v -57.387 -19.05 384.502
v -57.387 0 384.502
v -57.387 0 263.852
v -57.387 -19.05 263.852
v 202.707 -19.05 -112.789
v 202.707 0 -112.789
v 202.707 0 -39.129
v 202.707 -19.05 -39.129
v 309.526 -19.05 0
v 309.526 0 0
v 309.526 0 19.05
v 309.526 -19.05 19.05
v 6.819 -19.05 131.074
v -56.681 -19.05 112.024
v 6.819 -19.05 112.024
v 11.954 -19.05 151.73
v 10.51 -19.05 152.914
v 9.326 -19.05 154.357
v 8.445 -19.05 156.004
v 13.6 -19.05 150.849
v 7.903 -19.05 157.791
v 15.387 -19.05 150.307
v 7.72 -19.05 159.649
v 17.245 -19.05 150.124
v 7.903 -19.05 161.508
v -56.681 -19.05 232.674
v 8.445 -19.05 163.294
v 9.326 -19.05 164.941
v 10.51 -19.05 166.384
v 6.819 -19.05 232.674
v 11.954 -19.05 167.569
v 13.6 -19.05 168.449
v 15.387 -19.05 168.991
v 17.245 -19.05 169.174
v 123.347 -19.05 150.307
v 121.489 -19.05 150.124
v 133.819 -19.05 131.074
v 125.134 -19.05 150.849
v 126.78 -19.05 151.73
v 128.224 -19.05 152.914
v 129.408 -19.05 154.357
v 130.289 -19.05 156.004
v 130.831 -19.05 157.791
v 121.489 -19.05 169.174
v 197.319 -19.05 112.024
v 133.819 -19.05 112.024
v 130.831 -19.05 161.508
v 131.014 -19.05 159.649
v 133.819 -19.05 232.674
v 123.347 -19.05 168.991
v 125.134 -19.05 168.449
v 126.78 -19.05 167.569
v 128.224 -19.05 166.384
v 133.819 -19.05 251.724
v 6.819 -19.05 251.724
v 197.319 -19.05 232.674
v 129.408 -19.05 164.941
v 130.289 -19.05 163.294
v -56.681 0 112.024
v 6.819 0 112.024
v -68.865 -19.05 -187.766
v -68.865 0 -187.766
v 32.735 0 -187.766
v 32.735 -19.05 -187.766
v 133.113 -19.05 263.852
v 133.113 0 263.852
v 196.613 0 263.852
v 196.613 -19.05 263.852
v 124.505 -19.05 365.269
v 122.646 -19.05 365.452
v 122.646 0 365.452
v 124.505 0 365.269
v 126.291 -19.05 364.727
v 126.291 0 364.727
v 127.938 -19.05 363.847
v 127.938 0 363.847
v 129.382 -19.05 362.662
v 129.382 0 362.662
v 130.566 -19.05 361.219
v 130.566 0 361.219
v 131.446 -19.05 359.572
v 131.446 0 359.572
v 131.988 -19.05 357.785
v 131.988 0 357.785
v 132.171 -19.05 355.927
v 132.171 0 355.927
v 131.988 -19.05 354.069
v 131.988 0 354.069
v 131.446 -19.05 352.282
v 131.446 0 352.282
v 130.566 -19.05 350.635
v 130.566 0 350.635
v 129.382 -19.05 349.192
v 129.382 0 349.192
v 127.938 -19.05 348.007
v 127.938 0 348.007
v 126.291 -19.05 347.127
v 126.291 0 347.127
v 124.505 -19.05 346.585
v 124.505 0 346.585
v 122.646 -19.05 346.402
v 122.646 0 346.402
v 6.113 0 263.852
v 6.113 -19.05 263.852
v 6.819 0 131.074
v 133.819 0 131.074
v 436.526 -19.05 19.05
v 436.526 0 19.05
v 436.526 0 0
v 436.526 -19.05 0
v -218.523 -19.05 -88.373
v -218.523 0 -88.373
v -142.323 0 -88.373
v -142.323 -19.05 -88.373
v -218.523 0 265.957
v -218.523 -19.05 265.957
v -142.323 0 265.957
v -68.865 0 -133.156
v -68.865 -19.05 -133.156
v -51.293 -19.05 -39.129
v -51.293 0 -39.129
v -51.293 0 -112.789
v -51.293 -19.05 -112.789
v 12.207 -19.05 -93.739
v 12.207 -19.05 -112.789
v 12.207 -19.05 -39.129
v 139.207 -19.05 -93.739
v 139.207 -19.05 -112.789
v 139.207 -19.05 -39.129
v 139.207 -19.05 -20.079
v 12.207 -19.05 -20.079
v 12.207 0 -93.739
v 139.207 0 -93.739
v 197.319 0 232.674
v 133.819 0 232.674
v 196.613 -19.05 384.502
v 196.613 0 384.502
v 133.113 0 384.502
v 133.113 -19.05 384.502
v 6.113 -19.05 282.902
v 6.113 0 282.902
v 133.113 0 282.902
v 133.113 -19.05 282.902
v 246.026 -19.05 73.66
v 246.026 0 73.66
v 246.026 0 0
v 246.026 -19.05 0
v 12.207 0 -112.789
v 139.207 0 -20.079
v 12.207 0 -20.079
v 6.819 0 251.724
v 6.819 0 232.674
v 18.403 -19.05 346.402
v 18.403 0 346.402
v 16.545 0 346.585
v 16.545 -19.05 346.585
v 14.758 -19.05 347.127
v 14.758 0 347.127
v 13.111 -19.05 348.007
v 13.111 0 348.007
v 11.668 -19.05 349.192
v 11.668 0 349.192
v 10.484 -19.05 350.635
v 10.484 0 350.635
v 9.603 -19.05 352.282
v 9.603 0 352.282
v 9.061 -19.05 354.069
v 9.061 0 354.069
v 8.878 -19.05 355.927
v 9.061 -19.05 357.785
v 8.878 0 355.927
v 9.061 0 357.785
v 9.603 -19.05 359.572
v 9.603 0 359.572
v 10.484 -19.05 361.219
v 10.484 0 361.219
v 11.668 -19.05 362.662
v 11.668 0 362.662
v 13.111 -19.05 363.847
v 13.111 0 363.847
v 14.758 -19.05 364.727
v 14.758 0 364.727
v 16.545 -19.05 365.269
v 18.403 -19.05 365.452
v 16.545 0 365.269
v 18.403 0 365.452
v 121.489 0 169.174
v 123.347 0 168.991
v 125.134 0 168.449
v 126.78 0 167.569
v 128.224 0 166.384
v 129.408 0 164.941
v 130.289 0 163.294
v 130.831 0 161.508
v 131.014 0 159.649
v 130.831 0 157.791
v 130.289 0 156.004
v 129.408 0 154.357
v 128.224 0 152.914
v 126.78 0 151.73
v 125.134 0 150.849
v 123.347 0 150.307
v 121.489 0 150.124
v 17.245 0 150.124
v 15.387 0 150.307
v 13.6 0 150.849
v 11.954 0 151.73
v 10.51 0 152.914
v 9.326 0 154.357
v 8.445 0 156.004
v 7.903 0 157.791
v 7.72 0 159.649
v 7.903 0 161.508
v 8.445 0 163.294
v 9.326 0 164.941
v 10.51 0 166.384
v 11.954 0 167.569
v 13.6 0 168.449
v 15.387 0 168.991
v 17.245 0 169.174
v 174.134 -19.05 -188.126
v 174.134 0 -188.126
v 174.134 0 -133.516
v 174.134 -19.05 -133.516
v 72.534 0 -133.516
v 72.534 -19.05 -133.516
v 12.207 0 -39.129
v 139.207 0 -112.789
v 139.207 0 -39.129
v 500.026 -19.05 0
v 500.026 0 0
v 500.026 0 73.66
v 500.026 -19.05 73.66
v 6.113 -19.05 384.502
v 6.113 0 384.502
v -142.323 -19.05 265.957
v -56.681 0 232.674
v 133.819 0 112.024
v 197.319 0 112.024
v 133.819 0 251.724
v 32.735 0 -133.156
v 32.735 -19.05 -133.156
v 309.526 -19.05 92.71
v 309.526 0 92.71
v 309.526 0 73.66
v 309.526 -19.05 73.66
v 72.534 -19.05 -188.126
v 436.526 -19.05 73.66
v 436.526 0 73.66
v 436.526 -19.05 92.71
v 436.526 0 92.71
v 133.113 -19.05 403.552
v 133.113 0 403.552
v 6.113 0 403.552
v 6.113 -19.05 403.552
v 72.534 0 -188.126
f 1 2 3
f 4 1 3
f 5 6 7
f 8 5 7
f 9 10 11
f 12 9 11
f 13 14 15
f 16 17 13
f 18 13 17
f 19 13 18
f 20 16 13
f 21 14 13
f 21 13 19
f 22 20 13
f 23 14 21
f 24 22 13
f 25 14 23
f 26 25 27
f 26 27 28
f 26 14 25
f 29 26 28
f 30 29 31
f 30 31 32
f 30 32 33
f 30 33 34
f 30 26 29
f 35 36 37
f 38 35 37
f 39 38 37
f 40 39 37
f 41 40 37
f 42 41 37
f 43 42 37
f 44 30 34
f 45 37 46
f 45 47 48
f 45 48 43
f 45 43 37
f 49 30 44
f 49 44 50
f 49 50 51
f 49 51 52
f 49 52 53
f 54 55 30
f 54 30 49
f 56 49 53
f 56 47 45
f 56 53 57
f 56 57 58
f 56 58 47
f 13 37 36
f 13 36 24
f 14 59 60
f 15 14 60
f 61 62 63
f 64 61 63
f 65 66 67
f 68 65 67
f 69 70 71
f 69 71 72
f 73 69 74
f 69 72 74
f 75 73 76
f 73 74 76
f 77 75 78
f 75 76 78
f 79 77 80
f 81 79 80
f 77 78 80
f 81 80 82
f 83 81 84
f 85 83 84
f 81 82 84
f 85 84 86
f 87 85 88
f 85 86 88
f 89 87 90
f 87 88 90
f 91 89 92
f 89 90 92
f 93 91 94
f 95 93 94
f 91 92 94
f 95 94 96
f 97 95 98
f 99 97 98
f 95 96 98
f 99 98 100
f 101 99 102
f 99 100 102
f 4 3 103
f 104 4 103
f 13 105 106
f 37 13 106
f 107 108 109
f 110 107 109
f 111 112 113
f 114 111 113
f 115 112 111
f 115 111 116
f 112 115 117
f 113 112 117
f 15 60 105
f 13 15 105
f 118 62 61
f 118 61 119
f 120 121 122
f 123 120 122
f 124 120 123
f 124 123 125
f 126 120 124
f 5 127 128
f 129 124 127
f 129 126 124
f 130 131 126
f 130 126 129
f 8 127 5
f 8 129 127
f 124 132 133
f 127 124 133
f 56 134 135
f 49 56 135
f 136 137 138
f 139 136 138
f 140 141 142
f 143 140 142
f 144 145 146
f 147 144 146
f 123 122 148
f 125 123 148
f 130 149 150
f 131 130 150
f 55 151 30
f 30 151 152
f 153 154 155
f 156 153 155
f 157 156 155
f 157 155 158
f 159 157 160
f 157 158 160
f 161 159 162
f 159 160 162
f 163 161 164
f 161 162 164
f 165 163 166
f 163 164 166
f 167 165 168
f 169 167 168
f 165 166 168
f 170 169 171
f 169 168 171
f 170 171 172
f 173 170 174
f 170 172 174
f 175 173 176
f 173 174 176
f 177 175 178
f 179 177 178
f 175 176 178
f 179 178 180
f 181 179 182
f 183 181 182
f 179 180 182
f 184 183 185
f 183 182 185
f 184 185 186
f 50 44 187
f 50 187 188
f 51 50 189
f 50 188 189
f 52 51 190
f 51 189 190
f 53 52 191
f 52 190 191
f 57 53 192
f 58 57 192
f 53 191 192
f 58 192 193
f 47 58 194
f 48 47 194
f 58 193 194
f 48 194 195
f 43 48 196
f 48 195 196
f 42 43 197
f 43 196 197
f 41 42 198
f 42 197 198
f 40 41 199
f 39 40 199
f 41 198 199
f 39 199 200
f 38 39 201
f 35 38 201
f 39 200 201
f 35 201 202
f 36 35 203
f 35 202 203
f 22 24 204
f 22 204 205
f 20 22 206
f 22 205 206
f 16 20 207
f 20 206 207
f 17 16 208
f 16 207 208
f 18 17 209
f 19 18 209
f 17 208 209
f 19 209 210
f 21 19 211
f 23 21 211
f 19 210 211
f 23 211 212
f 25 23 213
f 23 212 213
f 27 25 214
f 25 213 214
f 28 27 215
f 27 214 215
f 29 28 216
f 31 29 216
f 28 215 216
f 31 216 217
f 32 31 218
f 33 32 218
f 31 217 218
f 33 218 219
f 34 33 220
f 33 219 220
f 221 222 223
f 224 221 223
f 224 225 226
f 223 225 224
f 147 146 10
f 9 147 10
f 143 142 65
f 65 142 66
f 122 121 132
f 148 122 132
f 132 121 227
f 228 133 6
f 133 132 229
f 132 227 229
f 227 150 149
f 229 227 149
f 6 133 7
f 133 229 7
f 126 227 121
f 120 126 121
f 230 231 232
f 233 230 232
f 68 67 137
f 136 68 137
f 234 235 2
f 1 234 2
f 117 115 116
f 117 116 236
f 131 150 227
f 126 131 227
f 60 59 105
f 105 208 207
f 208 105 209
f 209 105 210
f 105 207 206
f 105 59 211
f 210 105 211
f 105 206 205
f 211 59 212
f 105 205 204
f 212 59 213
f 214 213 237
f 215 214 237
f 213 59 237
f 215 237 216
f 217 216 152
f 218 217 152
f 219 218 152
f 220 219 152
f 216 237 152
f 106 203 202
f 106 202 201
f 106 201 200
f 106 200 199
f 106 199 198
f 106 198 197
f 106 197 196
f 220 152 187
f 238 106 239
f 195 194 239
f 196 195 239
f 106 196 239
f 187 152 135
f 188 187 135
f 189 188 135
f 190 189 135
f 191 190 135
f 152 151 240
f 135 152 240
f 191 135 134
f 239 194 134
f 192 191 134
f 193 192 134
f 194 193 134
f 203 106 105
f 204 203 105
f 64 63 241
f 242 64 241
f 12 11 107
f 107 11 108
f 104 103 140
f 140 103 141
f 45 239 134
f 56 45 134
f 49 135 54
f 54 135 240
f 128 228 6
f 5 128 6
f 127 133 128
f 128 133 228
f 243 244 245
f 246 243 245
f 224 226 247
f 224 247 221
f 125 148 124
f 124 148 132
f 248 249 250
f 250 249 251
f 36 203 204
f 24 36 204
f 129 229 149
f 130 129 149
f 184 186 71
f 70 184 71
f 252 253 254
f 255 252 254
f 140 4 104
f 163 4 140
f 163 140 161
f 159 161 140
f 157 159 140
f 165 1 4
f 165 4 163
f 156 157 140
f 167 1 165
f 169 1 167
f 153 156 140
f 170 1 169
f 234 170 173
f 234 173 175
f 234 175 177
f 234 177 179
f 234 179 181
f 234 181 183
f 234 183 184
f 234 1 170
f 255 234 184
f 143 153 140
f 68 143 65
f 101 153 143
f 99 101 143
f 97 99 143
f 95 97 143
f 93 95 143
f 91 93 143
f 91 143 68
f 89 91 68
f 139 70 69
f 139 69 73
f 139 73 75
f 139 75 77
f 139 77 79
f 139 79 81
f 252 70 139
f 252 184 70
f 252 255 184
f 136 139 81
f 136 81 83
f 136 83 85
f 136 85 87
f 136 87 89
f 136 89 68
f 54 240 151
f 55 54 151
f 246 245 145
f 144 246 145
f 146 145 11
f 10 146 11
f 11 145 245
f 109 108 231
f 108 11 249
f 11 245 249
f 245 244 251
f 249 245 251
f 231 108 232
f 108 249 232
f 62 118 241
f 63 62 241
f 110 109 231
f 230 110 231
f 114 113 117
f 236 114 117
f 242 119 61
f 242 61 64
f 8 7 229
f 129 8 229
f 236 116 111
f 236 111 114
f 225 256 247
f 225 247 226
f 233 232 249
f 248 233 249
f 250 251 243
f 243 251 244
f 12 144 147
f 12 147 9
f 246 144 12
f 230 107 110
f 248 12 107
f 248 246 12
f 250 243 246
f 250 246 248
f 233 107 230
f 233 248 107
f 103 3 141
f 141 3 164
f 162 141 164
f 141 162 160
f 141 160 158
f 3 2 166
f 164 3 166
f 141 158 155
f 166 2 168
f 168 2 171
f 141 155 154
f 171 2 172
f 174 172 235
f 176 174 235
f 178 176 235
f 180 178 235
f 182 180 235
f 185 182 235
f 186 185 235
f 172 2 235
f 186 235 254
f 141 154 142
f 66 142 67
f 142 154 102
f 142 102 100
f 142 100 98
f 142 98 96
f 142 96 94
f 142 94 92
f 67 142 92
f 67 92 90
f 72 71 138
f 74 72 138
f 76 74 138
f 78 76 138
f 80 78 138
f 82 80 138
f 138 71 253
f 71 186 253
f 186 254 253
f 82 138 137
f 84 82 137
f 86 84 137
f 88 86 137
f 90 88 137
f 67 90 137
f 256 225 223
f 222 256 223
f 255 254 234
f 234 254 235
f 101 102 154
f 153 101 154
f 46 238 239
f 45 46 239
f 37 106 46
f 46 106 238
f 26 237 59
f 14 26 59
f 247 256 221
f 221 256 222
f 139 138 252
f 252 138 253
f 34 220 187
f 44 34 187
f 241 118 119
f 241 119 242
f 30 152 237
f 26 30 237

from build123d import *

# Parameters (mm, degrees)
F0_W     = 76.2
F0_H     = 354.33
F1_DEPTH = 19.05
F0_W_2   = 101.6
F0_H_2   = 54.61
F2_DEPTH = 19.05


with BuildPart() as f1:
    # F0 (on Front) → F1 (new body)
    with BuildSketch(Plane.XZ):
        with Locations((-180.422981, 88.792352)):
            Rectangle(F0_W, F0_H)
    extrude(amount=F1_DEPTH)


with BuildPart() as f2:
    # F0 (on Front) → F2 (new body)
    with BuildSketch(Plane.XZ):
        Polygon((196.613275, 263.85193), (196.613275, 384.50193), (133.113275, 384.50193), (133.113275, 403.55193), (6.113275, 403.55193), (6.113275, 384.50193), (-57.386725, 384.50193), (-57.386725, 263.85193), (6.113275, 263.85193), (6.113275, 282.90193), (133.113275, 282.90193), (133.113275, 263.85193), align=None)
        with BuildLine():
            ThreePointArc((18.40325, 346.40193), (8.87825, 355.92693), (18.40325, 365.45193))
            Line((18.40325, 365.45193), (122.646435, 365.45193))
            ThreePointArc((122.646435, 365.45193), (132.171435, 355.92693), (122.646435, 346.40193))
            Line((122.646435, 346.40193), (18.40325, 346.40193))
        make_face(mode=Mode.SUBTRACT)
        Polygon((197.31865, 112.024289), (197.31865, 232.674289), (133.81865, 232.674289), (133.81865, 251.724289), (6.81865, 251.724289), (6.81865, 232.674289), (-56.68135, 232.674289), (-56.68135, 112.024289), (6.81865, 112.024289), (6.81865, 131.074289), (133.81865, 131.074289), (133.81865, 112.024289), align=None)
        with BuildLine():
            ThreePointArc((17.245385, 150.124289), (7.720385, 159.649289), (17.245385, 169.174289))
            Line((17.245385, 169.174289), (121.48857, 169.174289))
            ThreePointArc((121.48857, 169.174289), (131.01357, 159.649289), (121.48857, 150.124289))
            Line((121.48857, 150.124289), (17.245385, 150.124289))
        make_face(mode=Mode.SUBTRACT)
        Polygon((500.026173, 0), (500.026173, 73.66), (436.526173, 73.66), (436.526173, 92.71), (309.526173, 92.71), (309.526173, 73.66), (246.026173, 73.66), (246.026173, 0), (309.526173, 0), (309.526173, 19.05), (436.526173, 19.05), (436.526173, 0), align=None)
        Polygon((202.706903, -112.7891), (202.706903, -39.1291), (139.206903, -39.1291), (139.206903, -20.0791), (12.206903, -20.0791), (12.206903, -39.1291), (-51.293097, -39.1291), (-51.293097, -112.7891), (12.206903, -112.7891), (12.206903, -93.7391), (139.206903, -93.7391), (139.206903, -112.7891), align=None)
        with Locations((123.333705, -160.82134)):
            Rectangle(F0_W_2, F0_H_2)
        with Locations((-18.065077, -160.46094)):
            Rectangle(F0_W_2, F0_H_2)
    extrude(amount=F2_DEPTH)


solid = Compound([f1.part, f2.part])
